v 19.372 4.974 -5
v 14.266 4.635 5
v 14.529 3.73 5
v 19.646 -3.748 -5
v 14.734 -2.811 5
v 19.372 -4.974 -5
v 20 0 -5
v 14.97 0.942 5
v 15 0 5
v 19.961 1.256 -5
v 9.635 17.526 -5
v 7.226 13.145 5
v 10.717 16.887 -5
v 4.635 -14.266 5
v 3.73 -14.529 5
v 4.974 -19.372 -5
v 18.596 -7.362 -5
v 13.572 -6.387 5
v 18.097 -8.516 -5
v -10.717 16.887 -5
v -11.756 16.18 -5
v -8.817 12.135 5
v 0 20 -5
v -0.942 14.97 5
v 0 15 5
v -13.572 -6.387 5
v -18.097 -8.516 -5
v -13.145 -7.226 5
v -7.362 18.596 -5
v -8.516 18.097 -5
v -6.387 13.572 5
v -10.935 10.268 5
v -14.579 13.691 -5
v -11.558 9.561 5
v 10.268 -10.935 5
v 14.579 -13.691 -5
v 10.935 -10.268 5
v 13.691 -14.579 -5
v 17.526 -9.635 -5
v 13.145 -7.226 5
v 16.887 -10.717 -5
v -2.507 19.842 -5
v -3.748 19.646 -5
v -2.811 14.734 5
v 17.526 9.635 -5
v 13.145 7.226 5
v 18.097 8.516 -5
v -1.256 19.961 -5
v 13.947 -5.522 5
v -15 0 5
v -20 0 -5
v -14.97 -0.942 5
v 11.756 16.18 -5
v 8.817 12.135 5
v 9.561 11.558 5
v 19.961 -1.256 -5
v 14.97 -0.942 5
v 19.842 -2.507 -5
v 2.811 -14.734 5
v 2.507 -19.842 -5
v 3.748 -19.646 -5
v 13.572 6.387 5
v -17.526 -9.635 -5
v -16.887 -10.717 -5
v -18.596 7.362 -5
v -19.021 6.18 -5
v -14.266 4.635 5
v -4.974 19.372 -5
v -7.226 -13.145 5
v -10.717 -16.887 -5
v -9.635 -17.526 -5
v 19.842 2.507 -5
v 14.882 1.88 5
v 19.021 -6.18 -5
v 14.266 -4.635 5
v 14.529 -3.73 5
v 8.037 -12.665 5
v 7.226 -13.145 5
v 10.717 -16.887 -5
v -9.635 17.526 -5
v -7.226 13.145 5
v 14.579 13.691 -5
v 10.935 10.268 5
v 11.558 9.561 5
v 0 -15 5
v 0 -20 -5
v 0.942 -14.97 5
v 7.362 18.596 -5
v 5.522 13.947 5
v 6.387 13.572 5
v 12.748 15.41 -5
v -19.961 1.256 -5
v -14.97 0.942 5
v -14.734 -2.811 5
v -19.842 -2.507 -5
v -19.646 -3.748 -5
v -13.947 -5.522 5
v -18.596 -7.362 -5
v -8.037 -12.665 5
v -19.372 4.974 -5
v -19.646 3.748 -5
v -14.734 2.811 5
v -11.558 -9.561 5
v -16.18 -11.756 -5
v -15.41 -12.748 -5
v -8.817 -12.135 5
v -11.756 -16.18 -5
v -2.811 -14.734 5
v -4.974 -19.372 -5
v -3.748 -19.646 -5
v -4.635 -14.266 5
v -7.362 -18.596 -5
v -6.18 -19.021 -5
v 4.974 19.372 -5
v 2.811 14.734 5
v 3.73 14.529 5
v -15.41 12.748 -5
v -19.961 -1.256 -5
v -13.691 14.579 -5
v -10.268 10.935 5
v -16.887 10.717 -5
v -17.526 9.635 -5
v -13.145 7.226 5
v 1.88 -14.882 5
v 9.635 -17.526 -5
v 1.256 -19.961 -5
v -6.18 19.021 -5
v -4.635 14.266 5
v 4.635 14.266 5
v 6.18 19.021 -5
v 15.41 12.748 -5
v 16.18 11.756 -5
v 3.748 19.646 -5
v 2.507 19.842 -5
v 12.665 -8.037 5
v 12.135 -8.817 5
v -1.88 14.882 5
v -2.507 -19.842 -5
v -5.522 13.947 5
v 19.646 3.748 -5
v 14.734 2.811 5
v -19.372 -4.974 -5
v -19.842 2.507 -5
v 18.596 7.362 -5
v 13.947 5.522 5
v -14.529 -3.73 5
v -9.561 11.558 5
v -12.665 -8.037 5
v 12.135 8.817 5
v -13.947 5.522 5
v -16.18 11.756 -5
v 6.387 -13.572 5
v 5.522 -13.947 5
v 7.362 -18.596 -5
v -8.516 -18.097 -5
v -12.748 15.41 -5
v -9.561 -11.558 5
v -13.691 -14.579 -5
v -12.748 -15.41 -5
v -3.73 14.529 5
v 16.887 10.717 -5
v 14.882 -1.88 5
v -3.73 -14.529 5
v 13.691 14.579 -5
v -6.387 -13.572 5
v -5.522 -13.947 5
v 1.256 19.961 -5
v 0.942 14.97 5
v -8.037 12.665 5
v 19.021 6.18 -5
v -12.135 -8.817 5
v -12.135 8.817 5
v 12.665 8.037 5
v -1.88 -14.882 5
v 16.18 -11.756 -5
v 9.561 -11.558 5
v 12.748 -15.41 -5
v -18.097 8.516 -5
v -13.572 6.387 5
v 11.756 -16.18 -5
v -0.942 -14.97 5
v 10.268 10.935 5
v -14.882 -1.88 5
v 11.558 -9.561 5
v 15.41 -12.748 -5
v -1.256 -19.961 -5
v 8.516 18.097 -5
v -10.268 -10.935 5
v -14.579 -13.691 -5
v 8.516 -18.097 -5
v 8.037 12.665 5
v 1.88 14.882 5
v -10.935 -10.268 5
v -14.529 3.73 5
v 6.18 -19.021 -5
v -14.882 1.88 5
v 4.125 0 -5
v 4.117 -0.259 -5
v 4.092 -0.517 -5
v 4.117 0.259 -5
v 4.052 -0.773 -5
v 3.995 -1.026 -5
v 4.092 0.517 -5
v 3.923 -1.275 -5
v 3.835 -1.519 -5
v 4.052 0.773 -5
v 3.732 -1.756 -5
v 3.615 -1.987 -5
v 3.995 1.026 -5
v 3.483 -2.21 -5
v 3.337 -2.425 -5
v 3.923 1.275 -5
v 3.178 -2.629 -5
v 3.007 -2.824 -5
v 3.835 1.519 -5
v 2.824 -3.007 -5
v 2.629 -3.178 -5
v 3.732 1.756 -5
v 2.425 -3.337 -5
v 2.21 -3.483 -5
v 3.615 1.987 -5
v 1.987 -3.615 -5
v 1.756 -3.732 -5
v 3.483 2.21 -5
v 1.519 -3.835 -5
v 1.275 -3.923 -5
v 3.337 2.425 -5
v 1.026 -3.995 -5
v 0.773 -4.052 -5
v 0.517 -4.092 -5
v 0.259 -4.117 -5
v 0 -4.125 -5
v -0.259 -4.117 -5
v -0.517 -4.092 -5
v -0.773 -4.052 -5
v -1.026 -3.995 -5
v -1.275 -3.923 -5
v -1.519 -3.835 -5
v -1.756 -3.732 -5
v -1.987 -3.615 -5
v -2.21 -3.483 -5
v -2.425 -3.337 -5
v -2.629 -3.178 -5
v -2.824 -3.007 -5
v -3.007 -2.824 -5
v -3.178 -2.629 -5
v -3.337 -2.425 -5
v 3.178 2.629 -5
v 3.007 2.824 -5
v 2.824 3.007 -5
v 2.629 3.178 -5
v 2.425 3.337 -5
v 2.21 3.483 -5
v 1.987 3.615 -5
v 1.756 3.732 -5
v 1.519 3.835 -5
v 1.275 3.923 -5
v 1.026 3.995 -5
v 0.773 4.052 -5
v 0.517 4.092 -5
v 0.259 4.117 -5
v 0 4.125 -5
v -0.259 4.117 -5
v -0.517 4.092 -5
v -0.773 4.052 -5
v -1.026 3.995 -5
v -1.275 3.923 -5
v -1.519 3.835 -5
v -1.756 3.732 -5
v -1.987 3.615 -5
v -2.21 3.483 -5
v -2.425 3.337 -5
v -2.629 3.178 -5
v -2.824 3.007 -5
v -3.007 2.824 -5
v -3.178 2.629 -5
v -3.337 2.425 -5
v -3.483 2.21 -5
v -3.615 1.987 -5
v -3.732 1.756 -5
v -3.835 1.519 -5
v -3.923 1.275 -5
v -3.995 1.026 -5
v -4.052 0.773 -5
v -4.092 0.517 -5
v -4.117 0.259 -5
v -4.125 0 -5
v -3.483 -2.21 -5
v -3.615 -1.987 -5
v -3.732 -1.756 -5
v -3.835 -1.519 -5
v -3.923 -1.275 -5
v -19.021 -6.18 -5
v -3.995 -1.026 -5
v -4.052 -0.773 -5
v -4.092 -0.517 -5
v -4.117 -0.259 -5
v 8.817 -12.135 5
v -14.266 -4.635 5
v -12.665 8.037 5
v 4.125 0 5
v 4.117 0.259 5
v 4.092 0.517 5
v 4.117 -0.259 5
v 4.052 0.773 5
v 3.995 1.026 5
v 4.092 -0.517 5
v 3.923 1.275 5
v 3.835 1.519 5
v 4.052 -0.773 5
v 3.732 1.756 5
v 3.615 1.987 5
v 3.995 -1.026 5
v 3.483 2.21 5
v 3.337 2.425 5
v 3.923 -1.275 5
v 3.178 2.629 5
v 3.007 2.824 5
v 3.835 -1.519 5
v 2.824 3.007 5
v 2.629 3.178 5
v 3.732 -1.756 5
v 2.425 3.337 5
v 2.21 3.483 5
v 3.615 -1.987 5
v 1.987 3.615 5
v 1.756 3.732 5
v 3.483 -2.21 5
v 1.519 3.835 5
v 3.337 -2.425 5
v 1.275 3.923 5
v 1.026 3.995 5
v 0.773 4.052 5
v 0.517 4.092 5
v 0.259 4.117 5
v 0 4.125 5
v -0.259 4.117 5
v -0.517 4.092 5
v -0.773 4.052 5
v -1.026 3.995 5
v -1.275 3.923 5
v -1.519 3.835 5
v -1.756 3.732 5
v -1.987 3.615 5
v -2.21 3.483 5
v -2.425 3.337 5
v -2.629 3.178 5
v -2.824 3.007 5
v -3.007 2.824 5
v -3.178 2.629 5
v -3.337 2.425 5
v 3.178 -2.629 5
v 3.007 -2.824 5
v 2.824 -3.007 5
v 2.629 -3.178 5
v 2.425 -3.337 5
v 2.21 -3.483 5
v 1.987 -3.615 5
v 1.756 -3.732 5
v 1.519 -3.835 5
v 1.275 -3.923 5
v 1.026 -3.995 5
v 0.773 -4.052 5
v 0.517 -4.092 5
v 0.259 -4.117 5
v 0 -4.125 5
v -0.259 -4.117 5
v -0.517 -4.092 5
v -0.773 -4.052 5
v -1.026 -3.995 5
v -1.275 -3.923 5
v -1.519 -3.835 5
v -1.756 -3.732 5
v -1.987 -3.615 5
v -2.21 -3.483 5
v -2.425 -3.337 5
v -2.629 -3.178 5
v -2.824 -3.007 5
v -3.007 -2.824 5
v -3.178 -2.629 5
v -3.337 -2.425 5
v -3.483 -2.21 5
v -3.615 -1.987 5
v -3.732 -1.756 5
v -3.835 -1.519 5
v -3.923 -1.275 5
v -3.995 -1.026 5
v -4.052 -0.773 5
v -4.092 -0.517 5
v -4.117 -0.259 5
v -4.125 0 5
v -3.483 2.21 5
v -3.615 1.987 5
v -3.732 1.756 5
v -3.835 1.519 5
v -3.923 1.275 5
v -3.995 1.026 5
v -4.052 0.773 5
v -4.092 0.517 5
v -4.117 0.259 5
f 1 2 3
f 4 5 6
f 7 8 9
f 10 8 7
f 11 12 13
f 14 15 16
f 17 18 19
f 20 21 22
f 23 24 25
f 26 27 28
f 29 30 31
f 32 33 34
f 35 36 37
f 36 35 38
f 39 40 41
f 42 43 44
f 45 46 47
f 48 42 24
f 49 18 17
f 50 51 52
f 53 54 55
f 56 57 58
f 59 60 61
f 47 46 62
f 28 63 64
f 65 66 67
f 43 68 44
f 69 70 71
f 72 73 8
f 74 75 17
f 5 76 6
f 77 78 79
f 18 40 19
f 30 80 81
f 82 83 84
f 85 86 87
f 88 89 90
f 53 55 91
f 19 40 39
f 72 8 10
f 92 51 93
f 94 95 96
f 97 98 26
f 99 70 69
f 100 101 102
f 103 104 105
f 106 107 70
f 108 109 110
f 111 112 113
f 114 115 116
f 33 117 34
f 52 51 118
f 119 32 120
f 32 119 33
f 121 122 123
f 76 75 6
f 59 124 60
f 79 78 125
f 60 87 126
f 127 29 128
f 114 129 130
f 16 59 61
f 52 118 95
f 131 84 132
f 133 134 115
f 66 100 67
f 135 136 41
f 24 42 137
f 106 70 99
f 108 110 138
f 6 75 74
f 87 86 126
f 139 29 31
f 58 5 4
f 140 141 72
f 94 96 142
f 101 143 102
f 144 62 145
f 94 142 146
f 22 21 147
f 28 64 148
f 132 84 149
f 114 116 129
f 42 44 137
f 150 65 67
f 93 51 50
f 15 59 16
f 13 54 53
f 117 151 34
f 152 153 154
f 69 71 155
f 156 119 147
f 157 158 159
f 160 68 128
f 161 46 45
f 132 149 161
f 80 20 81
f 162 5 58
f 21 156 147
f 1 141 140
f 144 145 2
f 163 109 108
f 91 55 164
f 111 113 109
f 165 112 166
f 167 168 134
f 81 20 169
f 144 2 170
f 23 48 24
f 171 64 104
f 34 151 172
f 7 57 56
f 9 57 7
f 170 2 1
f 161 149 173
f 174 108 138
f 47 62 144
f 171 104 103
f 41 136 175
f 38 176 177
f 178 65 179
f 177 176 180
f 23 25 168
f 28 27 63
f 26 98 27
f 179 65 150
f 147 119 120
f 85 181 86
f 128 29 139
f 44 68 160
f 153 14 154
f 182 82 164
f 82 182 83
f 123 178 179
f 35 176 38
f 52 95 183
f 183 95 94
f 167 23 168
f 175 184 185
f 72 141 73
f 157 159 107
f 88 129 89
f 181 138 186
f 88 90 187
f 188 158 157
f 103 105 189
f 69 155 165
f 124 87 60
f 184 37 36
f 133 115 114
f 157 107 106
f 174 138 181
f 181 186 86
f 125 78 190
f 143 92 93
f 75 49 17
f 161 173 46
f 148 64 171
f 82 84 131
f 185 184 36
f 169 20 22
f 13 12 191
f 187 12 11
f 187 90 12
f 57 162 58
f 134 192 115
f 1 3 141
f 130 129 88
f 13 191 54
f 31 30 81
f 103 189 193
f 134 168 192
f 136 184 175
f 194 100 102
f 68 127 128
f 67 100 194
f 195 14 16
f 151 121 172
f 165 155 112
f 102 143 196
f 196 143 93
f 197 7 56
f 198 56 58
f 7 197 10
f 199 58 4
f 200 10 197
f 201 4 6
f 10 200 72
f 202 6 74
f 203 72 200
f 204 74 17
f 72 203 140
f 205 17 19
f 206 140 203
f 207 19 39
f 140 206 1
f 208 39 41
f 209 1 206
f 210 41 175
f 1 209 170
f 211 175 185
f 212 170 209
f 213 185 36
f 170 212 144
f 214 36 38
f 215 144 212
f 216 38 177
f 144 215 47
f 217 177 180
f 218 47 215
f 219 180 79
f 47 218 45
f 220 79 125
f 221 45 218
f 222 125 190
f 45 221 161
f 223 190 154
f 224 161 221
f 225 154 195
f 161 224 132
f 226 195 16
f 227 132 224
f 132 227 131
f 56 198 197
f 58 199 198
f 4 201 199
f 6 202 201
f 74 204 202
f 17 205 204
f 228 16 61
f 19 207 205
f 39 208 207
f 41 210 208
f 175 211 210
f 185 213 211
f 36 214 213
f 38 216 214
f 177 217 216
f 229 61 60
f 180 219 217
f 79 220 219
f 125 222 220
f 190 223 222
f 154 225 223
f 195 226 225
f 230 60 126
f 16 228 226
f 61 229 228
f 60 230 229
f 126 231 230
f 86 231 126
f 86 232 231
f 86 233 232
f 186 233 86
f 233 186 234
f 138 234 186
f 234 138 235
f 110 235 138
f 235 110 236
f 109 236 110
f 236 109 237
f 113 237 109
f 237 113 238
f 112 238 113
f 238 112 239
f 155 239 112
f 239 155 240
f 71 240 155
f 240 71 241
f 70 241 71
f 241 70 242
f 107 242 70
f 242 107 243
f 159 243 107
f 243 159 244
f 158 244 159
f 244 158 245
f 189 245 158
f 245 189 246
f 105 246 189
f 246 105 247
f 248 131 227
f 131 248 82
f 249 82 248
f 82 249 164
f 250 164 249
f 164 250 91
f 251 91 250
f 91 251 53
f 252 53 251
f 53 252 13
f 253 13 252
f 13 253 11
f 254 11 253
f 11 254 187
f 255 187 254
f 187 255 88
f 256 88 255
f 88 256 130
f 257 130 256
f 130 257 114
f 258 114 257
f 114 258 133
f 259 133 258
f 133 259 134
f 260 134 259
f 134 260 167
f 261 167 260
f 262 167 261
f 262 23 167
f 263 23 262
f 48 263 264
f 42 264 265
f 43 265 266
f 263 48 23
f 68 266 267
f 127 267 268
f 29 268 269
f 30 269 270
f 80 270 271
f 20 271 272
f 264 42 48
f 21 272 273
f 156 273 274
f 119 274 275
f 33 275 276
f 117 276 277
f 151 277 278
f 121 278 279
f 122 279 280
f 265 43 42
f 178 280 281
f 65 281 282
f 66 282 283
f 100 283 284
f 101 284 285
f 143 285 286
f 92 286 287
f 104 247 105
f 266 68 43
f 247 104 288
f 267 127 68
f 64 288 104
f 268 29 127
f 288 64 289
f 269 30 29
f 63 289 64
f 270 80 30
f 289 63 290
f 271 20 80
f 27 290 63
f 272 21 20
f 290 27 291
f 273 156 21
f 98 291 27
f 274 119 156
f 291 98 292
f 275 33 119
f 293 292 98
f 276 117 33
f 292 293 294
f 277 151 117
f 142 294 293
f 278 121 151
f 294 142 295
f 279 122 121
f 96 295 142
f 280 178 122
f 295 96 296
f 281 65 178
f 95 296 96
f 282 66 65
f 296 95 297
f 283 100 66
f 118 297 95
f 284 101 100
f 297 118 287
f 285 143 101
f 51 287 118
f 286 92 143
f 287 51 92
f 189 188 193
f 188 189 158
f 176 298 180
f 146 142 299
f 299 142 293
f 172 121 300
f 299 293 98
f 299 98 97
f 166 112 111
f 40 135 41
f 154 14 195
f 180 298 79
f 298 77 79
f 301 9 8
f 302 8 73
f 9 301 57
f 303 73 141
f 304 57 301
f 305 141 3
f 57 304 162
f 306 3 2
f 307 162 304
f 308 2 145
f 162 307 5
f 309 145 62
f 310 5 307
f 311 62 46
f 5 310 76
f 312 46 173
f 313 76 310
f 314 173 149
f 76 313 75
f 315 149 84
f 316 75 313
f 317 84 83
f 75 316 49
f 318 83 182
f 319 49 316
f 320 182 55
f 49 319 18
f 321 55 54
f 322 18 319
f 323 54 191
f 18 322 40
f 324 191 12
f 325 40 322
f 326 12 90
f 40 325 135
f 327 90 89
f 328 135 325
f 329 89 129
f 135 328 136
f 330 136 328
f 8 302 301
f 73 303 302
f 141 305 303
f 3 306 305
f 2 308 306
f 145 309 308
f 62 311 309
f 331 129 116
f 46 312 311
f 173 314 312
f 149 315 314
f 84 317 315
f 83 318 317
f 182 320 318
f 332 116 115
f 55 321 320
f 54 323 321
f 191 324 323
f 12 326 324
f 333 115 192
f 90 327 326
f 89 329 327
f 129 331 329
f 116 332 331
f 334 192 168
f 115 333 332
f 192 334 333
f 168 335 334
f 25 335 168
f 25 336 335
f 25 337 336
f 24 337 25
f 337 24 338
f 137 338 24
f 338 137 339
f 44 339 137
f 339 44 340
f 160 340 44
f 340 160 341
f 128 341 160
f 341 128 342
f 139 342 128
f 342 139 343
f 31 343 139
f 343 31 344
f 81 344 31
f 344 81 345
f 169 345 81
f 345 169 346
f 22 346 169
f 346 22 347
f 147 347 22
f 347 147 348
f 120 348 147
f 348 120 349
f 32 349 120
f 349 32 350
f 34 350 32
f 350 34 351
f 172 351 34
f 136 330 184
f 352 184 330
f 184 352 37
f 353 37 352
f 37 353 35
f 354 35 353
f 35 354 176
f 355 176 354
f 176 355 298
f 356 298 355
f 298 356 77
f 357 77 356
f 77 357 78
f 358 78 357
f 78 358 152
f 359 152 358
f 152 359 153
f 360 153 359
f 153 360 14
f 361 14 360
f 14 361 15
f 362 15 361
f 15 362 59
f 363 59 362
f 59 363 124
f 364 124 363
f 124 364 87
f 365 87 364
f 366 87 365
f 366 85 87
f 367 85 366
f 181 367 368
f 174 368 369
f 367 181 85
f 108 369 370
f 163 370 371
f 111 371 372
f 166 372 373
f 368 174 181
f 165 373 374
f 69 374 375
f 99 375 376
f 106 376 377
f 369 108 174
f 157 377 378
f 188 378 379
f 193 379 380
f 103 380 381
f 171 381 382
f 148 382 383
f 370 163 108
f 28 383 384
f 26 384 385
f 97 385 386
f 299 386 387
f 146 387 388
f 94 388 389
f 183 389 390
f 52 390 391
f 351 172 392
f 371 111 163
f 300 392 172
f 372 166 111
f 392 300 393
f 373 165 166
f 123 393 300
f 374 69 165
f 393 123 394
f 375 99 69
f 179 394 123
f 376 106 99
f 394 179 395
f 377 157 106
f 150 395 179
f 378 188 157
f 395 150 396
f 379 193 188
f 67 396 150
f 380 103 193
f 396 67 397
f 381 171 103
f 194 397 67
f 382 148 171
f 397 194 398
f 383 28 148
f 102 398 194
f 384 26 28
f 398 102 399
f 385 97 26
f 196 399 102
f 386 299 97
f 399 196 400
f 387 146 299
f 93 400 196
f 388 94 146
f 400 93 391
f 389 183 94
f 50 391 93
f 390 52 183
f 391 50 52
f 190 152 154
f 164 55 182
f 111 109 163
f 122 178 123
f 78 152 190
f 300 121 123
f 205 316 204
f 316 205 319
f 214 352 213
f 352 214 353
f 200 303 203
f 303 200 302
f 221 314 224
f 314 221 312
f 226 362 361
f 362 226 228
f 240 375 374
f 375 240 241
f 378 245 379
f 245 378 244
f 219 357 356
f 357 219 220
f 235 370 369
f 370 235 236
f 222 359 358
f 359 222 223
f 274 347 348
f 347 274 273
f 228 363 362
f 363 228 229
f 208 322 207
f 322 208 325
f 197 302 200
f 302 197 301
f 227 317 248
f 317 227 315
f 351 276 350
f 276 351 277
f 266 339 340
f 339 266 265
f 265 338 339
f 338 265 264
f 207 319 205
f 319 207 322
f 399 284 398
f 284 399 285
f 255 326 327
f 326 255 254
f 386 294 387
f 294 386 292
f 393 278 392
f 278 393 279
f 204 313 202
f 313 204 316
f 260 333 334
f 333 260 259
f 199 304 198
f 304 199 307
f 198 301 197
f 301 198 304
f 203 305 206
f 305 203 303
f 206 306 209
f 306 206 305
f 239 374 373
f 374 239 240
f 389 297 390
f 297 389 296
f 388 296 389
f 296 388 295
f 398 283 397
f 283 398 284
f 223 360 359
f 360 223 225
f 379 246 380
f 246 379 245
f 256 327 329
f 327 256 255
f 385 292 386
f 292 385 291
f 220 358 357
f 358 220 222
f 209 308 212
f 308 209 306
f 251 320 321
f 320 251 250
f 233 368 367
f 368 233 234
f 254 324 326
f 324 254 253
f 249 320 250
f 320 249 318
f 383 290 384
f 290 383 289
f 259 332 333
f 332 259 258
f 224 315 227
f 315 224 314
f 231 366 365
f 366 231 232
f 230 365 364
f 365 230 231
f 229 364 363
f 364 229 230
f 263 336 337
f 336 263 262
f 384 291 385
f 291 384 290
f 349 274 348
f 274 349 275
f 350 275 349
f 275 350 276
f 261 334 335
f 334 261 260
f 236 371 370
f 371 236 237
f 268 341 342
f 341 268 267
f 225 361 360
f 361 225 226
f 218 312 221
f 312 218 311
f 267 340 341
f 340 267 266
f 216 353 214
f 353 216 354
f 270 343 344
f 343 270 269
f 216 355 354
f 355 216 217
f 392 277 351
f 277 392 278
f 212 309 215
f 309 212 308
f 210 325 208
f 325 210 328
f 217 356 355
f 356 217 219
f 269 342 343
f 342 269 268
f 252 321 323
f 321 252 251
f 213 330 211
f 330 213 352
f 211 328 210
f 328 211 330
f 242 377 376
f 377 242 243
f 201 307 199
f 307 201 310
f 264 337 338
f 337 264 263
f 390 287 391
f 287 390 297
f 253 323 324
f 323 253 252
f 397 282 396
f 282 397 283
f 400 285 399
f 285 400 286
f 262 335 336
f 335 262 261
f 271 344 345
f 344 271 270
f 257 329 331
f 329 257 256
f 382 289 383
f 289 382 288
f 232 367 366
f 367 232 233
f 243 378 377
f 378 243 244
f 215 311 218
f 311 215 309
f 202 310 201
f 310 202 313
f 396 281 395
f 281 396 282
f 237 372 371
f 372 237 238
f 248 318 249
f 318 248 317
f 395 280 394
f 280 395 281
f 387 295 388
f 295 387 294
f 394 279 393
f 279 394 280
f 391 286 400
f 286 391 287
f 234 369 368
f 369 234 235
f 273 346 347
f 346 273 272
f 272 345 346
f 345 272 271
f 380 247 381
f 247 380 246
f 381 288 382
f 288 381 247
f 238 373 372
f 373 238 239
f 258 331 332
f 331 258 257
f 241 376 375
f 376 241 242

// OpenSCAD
/* 
Plug for coil winder

Nominal ID
- 1" schedule 40 PVC pipe : ID=26
- 1-1/2" (PP or PVC) drain pipe : ID=35

*/

$fn=100;

// config params:
NZ_D=0.4;			// nozzle dia
NZ_H=0.25;			// nozzle height
HALF=0;				// 1=half, 0=whole
//
H=10;					// height
OD1=40;				// outer diameter (large)
OD2=30;				// outer diameter (small)
ID=(HALF)?8:8.25;	// inner diameter
USZ=0.1;				// face undersize
//
KW=6;					// key width
KH=6;					// key height
KD=3;					// key depth
KOSZ=0.15;			// key hole osz
KX=(OD1+OD2)/2;	// key x


//rotate([0,0,180]) rotate_extrude(angle=a) translate([-r,0,0]) polygon(points=[[0,-h],[h,0],[0,h]]);
module key(hole=true){
	osz=(hole)?KOSZ:0;
	ymid=((OD1+OD2)/2+ID)/4;
	yloc=(hole)?ymid:-ymid;
	x=KW/2;
	y=KH/2;
	h=KD+osz;
	translate([0,ymid,0]) rotate([90,0,90]) translate([0,0,-h]) linear_extrude(2*h) offset(delta=osz) polygon(points=[[-x,0],[0,y],[x,0],[0,-y],]);
}

module plug(){
	difference(){
		cylinder(d1=OD1, d2=OD2, h=H, center=true);
		cylinder(d=ID, h=H+0.02, center=true);
	}
}

module all(){
	if (HALF) {
		key(false);
		difference(){
			plug();
			translate([OD1/2-USZ,0,0]) cube([OD1,OD1,H+0.02], center=true);
			rotate([0,0,180]) key(true);
		}
	}
	else { 
		plug(); 
	}
}

all();
